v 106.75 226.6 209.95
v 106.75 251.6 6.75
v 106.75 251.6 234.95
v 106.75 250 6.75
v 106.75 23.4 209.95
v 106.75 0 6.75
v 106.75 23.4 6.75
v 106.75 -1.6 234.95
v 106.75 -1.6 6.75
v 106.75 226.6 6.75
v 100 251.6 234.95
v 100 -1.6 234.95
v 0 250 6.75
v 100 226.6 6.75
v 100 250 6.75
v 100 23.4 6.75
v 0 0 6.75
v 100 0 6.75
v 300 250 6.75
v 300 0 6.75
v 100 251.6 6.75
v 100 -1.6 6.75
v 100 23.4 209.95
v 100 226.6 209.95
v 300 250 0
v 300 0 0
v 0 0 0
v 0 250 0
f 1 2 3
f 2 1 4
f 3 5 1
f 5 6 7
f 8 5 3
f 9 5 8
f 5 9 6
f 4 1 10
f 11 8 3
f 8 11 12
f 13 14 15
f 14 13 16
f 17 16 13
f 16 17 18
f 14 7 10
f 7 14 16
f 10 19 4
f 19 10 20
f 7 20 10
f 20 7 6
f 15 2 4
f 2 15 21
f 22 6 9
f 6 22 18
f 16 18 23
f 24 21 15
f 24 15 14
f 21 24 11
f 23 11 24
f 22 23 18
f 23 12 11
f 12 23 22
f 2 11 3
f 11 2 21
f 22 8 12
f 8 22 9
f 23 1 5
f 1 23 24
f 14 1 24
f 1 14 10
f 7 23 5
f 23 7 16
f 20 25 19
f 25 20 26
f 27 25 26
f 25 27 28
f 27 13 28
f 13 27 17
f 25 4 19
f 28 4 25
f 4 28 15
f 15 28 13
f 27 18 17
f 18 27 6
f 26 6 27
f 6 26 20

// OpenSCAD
/*
    base[3] = length,width,thickness of base
    arch[3] = height,width,thickness of arch
    gap[2]  = height,width of gap
    offset  = distance to move arch

    constraints:
    arch[1] <= base[1], the arch must fit the base
    gap[x] < arch[x], the gap must fit the arch
*/

module frame (base,arch,gap,offset) {
  union() {
    cube(base);
    translate([offset,(base[1]-arch[1])/2,base[2]])
      difference(){
        cube([arch[2],arch[1],arch[0]]);
        translate([-1,(arch[1]-gap[1])/2,-1])
        cube([arch[2]+2,gap[1],gap[0]+1]);
      }
  }
}

frame([300,250,6.75],[228.2,253.2,6.75], [203.2,203.2],100);
